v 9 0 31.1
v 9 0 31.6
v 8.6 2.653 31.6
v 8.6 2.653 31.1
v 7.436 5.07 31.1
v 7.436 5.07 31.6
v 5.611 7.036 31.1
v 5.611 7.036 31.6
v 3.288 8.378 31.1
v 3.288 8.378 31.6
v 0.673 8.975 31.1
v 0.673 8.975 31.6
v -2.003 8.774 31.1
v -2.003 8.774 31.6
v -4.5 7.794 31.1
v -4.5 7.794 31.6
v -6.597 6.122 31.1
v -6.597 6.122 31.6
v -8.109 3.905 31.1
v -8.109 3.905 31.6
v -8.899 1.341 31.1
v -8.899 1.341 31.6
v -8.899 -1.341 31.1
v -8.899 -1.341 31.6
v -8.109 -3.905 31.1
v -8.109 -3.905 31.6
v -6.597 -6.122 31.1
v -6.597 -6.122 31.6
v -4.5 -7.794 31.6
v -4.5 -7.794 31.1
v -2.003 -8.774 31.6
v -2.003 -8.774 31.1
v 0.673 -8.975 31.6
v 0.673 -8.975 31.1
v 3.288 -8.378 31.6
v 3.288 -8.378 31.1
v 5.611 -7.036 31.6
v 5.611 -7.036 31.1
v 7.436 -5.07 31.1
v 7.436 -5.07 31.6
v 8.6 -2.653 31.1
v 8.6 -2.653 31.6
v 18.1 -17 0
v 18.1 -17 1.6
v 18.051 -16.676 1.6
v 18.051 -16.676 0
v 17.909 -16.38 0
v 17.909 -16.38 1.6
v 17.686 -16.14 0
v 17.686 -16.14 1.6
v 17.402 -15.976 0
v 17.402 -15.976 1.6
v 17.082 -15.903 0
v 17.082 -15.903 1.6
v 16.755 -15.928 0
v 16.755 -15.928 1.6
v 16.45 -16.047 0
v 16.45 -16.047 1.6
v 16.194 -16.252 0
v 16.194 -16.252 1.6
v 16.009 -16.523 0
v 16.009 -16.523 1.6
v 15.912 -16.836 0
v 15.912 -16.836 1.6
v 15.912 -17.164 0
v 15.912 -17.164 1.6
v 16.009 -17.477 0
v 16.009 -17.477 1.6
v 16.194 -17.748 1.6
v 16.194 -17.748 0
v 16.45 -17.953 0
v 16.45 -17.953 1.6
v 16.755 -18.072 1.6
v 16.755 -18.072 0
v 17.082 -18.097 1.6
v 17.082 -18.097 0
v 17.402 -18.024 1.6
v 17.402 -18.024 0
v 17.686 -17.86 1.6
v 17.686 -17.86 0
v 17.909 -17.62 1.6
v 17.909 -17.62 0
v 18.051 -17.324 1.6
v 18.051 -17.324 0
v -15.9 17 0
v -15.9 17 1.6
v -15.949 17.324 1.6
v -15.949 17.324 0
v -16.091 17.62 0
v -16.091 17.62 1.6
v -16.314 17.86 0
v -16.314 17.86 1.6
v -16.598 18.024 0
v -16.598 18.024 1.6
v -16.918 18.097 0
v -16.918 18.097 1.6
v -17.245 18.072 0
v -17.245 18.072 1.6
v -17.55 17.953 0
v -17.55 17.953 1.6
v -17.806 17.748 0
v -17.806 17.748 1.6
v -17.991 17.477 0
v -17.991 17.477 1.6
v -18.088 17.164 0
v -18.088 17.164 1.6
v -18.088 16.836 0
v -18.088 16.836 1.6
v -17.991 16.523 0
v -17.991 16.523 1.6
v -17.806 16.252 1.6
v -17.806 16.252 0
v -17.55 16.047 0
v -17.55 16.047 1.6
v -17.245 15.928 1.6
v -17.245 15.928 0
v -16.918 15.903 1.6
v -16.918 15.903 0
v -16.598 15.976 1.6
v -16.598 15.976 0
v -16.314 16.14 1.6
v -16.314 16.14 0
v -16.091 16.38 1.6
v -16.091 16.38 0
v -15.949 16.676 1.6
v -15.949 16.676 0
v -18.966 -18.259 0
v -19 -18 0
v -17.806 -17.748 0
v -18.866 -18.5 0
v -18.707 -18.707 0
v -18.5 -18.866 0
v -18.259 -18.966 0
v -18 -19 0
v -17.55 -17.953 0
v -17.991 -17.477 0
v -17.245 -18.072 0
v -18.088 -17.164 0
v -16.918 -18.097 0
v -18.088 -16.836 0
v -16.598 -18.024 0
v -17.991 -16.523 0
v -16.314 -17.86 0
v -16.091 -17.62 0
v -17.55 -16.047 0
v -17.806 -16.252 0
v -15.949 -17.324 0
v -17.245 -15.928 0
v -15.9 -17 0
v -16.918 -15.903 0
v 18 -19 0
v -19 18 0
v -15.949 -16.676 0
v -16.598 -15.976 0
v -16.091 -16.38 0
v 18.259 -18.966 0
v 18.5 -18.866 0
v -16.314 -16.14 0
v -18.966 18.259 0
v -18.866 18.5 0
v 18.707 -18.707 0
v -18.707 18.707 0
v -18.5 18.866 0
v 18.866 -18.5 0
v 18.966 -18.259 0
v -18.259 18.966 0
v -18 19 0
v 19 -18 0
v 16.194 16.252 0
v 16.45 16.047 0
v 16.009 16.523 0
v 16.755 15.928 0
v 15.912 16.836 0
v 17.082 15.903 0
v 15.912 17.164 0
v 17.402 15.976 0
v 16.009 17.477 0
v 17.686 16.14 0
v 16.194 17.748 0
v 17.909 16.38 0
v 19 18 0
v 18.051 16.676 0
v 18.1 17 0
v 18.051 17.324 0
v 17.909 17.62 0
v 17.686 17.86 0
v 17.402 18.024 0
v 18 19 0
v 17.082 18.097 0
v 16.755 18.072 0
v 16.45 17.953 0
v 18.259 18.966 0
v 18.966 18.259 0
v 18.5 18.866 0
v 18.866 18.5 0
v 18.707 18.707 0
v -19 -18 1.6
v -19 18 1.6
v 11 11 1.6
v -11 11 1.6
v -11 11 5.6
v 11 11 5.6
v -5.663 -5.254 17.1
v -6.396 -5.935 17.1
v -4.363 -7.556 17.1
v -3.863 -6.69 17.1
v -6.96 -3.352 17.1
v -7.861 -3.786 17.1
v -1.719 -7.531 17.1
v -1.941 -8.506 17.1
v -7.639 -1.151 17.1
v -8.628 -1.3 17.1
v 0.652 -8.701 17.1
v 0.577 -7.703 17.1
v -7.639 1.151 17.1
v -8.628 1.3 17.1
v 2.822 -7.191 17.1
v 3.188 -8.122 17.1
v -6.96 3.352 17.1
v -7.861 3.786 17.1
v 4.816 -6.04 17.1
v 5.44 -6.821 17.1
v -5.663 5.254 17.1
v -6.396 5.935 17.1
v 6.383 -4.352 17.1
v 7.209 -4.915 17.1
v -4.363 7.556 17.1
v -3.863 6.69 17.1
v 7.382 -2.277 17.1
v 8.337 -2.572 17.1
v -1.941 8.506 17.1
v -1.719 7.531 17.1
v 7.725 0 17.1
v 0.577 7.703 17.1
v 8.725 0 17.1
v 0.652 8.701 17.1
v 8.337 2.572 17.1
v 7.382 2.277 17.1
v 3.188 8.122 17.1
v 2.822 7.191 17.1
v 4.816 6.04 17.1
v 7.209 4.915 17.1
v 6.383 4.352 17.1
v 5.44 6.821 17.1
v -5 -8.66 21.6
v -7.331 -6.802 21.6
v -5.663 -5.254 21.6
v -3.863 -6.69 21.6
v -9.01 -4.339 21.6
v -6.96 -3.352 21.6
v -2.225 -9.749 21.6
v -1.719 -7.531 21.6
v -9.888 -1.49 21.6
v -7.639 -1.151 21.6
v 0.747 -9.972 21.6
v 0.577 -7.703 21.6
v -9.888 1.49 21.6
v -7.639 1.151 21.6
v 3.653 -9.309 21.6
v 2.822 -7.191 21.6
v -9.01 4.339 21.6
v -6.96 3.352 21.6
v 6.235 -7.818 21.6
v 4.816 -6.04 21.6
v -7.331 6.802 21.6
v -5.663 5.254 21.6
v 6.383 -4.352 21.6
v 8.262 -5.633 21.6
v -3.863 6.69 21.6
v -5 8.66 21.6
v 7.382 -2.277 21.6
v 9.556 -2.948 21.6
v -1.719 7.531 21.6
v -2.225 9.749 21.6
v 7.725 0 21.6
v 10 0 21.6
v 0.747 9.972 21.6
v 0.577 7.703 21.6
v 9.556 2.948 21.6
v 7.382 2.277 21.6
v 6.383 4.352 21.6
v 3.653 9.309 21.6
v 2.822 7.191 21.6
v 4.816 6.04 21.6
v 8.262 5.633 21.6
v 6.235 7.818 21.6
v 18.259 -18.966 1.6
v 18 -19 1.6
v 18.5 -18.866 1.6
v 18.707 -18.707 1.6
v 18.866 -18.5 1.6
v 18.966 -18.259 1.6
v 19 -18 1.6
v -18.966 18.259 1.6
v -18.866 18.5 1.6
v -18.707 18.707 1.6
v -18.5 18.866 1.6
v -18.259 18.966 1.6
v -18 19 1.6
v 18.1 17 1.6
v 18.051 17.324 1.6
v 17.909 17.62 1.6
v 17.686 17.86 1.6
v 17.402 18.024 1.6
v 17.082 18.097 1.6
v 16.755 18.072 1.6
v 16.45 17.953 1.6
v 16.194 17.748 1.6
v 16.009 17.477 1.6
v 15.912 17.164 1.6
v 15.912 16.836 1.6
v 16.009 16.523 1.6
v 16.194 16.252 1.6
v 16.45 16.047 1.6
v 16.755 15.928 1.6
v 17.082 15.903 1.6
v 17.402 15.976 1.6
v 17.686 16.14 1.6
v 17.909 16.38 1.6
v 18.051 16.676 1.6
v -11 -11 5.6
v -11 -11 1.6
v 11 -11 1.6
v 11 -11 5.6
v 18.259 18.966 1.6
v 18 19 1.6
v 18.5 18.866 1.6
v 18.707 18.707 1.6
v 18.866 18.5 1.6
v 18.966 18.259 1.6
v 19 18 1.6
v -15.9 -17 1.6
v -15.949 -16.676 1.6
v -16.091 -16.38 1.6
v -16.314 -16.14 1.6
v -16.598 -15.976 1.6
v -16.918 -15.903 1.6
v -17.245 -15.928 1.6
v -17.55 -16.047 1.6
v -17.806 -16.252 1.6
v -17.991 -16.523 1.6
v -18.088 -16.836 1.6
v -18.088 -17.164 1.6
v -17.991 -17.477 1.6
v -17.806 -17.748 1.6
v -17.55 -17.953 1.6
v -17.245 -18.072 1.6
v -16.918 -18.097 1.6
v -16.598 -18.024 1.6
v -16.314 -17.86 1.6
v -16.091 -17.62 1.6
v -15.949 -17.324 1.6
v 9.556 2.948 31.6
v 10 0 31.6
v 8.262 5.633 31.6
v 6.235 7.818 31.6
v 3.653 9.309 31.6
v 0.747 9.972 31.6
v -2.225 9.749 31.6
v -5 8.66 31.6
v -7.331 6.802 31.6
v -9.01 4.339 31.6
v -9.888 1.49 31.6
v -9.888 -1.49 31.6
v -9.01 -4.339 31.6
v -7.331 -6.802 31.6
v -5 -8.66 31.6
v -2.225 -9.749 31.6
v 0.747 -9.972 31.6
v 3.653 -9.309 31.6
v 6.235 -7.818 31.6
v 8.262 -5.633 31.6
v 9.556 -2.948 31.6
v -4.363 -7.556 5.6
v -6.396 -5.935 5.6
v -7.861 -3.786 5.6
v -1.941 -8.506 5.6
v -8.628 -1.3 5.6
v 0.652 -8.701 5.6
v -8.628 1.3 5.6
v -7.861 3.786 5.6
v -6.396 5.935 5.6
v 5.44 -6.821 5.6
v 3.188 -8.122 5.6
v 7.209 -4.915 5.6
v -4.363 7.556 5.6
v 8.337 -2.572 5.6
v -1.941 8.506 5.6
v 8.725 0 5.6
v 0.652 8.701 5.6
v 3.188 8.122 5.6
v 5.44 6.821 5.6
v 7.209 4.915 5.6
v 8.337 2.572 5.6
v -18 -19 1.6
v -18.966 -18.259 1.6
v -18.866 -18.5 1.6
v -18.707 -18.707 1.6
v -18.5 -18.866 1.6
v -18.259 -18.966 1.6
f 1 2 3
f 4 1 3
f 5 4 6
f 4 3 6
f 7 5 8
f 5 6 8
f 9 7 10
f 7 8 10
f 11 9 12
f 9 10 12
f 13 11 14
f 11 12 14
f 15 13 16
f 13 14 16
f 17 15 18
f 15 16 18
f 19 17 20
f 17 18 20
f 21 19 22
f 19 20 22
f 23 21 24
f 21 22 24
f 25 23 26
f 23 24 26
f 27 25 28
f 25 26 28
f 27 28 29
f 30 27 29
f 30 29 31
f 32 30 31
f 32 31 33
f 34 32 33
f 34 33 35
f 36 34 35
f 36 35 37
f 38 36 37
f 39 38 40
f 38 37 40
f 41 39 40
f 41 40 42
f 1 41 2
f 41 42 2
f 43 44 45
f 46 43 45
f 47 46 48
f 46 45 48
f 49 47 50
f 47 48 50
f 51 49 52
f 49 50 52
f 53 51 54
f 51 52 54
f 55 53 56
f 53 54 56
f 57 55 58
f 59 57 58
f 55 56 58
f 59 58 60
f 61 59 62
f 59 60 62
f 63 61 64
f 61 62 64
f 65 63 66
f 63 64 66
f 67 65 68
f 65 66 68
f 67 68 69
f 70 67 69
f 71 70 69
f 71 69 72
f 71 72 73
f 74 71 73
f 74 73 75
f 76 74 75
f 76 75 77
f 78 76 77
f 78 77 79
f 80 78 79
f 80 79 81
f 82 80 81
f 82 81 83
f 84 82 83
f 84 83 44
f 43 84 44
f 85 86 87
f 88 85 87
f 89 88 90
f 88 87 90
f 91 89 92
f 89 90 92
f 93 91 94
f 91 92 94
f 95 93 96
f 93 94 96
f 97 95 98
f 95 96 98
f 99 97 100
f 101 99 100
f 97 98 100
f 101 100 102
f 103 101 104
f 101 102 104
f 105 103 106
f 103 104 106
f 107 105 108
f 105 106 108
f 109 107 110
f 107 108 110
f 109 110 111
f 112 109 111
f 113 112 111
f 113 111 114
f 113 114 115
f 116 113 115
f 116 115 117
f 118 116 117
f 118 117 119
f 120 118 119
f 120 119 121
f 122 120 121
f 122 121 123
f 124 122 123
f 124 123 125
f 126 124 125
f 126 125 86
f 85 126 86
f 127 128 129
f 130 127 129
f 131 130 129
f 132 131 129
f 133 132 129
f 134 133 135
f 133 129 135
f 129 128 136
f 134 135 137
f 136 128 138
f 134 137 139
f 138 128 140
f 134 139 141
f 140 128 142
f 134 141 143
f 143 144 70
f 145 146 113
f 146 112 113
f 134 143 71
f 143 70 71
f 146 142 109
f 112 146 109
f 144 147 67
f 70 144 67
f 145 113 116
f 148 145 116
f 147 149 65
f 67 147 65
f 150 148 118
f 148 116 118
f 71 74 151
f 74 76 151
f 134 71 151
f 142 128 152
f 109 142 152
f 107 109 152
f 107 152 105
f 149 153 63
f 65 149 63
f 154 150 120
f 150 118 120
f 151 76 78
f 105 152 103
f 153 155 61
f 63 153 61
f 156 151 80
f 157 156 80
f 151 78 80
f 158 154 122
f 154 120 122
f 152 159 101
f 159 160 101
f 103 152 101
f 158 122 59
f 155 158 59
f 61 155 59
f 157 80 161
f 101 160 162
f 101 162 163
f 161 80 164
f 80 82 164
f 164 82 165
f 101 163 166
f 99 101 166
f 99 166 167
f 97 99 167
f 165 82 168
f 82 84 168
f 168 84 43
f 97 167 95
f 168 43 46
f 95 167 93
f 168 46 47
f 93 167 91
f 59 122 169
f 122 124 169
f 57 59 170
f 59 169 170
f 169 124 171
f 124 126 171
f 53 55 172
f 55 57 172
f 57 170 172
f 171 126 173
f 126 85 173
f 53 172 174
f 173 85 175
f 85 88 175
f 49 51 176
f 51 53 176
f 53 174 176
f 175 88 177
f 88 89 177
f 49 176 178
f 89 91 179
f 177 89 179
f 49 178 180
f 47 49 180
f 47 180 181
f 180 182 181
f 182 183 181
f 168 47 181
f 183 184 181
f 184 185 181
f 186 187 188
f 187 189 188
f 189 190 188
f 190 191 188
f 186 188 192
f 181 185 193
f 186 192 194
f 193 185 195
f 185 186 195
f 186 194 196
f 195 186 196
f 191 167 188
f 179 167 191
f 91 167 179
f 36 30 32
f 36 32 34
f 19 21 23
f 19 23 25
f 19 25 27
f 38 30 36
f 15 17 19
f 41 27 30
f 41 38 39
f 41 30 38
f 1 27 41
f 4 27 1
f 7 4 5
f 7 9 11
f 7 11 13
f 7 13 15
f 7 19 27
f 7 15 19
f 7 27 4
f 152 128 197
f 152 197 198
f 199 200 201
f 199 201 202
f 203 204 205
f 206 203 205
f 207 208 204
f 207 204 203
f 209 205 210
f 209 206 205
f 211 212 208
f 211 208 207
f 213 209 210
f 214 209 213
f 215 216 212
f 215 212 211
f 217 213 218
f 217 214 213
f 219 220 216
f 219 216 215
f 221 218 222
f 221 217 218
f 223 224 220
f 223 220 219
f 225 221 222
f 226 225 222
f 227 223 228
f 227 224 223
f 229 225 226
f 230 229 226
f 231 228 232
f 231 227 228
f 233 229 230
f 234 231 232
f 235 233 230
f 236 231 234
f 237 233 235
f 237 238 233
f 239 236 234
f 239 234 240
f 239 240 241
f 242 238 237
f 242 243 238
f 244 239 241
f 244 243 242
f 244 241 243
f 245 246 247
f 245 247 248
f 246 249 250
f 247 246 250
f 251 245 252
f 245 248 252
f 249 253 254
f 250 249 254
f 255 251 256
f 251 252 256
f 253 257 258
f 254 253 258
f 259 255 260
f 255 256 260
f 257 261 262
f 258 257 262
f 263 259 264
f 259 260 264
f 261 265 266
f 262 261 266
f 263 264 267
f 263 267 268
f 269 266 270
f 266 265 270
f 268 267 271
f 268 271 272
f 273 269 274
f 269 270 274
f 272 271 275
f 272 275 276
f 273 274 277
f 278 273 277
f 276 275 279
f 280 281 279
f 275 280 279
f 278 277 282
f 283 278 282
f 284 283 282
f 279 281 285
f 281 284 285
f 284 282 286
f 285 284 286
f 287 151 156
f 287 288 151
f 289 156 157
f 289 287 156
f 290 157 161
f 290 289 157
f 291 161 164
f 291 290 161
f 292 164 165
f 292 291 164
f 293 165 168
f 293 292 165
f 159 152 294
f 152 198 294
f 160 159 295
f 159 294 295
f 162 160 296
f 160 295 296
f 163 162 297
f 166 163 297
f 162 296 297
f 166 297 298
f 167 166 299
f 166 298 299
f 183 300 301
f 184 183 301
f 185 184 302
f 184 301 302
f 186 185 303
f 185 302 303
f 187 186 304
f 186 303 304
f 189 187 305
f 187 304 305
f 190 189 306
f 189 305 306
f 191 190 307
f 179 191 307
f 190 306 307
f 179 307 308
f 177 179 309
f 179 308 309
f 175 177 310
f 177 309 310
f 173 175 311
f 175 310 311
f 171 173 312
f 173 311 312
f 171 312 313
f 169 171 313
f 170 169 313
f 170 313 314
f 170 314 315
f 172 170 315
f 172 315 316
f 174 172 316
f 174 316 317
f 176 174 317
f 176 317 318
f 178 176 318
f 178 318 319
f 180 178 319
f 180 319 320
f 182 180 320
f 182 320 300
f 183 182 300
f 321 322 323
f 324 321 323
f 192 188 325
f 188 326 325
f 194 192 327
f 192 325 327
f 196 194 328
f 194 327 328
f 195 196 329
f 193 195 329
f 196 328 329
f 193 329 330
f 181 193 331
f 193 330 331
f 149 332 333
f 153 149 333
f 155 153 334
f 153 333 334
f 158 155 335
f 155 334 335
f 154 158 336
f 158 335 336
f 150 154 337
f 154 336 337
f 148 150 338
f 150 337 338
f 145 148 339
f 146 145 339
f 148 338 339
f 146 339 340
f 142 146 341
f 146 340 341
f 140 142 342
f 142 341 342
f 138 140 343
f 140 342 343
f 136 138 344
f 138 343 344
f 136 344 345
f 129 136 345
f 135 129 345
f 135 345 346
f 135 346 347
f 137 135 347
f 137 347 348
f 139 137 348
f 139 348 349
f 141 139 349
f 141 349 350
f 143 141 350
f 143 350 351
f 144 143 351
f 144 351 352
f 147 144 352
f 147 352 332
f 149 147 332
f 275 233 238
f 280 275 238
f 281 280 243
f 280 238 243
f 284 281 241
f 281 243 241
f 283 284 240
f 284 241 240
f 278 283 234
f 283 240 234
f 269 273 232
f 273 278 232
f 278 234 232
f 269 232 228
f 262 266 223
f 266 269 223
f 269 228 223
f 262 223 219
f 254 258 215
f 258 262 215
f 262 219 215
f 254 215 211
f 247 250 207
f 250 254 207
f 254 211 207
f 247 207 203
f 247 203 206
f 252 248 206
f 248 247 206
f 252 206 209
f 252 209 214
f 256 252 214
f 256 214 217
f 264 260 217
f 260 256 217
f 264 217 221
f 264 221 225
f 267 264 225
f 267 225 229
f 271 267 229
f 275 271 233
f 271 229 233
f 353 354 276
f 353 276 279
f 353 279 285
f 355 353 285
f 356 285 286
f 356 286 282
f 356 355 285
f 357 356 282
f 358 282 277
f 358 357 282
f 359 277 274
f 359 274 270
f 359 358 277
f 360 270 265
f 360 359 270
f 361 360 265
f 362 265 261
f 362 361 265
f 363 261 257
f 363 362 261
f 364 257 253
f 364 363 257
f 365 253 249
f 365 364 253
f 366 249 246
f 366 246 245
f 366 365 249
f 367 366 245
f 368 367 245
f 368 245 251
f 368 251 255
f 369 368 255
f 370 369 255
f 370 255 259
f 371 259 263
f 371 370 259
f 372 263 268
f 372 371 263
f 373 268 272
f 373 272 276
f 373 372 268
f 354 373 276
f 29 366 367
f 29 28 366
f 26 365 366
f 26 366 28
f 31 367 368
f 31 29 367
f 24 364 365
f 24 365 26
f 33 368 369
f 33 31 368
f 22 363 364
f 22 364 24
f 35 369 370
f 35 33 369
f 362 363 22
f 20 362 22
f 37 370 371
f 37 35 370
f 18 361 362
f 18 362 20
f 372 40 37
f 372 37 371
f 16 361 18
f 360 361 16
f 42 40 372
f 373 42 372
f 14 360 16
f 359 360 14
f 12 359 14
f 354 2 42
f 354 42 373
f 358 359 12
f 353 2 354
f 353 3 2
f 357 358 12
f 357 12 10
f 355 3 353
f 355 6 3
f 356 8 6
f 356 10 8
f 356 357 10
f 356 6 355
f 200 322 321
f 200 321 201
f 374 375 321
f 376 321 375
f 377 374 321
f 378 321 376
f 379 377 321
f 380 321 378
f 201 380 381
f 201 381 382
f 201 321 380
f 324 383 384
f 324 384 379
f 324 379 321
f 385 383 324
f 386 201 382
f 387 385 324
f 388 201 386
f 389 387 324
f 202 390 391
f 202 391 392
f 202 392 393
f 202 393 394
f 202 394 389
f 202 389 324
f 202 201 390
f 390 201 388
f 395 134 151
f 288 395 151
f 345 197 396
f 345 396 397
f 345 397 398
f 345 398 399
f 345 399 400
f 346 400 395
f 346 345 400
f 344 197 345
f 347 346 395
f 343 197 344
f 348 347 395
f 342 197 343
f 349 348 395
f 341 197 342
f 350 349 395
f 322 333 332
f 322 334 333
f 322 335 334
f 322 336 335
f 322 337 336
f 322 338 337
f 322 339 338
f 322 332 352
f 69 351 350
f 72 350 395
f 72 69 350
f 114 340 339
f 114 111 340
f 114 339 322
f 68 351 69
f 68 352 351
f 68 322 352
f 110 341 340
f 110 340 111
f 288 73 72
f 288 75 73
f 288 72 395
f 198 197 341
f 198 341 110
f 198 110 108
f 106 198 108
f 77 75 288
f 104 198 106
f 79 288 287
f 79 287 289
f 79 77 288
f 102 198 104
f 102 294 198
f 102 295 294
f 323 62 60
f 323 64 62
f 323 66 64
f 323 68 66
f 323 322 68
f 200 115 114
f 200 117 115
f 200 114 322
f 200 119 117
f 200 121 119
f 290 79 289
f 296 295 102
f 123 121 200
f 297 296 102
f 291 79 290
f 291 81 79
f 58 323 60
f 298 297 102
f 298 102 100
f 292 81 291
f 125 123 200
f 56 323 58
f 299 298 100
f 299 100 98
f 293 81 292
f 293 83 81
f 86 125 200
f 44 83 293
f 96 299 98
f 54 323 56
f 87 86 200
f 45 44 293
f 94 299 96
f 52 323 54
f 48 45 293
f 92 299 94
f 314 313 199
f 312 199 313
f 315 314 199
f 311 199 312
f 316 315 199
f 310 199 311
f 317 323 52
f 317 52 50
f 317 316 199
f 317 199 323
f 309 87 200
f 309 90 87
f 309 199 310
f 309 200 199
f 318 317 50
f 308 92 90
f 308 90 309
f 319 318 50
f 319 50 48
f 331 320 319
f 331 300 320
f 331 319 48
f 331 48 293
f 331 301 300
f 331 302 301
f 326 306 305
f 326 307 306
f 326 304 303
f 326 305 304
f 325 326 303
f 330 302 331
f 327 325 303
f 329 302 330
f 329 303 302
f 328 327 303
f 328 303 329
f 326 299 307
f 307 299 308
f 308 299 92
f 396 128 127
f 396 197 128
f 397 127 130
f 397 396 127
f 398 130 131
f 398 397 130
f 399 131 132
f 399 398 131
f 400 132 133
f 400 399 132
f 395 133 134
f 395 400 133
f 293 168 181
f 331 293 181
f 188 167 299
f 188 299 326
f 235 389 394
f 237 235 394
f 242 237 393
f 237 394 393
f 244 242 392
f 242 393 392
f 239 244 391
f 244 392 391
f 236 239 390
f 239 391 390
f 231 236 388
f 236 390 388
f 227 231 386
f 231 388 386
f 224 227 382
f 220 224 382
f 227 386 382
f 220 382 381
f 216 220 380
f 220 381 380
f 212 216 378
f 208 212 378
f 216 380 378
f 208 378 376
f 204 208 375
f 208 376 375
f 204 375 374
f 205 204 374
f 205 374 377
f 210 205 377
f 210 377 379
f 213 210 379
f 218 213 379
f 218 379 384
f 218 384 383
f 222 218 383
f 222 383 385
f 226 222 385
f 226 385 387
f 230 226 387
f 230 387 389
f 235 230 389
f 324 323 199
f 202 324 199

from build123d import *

# Parameters (mm, degrees)
SKETCH_1_W          = 38
SKETCH_1_H          = 38
EXTRUDE_1_DEPTH     = 1.6
SKETCH_2_R          = 1.1
CUT_EXTRUDE_1_DEPTH = 27.917652201
FILLET_1_R          = 1
SKETCH_3_W          = 22
SKETCH_3_H          = 22
EXTRUDE_2_DEPTH     = 4
SKETCH_4_R          = 8.725
EXTRUDE_3_DEPTH     = 15.5
SKETCH_5_R          = 7.725
EXTRUDE_4_DEPTH     = 30
SKETCH_6_R          = 10
EXTRUDE_5_DEPTH     = 10
SKETCH_7_R          = 9
CUT_EXTRUDE_3_DEPTH = 0.5


with BuildPart() as part:
    # 스케치1 → 보스-돌출1 (new body)
    with BuildSketch(Plane.XY):
        Rectangle(SKETCH_1_W, SKETCH_1_H)
    extrude(amount=EXTRUDE_1_DEPTH)

    # 스케치2 → 컷-돌출1 (cut, through all)
    with BuildSketch(Plane.XY.offset(1.6)):
        with Locations((-17, 17)):
            Circle(SKETCH_2_R)
        with Locations((17, -17)):
            Circle(SKETCH_2_R)
        with Locations((17, 17)):
            Circle(SKETCH_2_R)
        with Locations((-17, -17)):
            Circle(SKETCH_2_R)
    extrude(amount=-CUT_EXTRUDE_1_DEPTH, mode=Mode.SUBTRACT)

    # 필렛1
    fillet_1_edges = [part.edges().sort_by_distance(p)[0] for p in [
        (-19, 19, 0.8),
        (19, 19, 0.8),
        (19, -19, 0.8),
        (-19, -19, 0.8),
    ]]
    fillet(fillet_1_edges, radius=FILLET_1_R)

    # 스케치3 → 보스-돌출2 (add)
    with BuildSketch(Plane.XY.offset(1.6)):
        Rectangle(SKETCH_3_W, SKETCH_3_H)
    extrude(amount=EXTRUDE_2_DEPTH)

    # 스케치4 → 보스-돌출3 (add)
    with BuildSketch(Plane.XY.offset(1.6)):
        Circle(SKETCH_4_R)
    extrude(amount=EXTRUDE_3_DEPTH)

    # 스케치5 → 보스-돌출4 (add)
    with BuildSketch(Plane.XY.offset(1.6)):
        Circle(SKETCH_5_R)
    extrude(amount=EXTRUDE_4_DEPTH)

    # 스케치6 → 보스-돌출5 (add)
    with BuildSketch(Plane.XY.offset(31.6)):
        Circle(SKETCH_6_R)
    extrude(amount=-EXTRUDE_5_DEPTH)

    # 스케치7 → 컷-돌출3 (cut)
    with BuildSketch(Plane.XY.offset(31.6)):
        Circle(SKETCH_7_R)
    extrude(amount=-CUT_EXTRUDE_3_DEPTH, mode=Mode.SUBTRACT)


solid = part.part
